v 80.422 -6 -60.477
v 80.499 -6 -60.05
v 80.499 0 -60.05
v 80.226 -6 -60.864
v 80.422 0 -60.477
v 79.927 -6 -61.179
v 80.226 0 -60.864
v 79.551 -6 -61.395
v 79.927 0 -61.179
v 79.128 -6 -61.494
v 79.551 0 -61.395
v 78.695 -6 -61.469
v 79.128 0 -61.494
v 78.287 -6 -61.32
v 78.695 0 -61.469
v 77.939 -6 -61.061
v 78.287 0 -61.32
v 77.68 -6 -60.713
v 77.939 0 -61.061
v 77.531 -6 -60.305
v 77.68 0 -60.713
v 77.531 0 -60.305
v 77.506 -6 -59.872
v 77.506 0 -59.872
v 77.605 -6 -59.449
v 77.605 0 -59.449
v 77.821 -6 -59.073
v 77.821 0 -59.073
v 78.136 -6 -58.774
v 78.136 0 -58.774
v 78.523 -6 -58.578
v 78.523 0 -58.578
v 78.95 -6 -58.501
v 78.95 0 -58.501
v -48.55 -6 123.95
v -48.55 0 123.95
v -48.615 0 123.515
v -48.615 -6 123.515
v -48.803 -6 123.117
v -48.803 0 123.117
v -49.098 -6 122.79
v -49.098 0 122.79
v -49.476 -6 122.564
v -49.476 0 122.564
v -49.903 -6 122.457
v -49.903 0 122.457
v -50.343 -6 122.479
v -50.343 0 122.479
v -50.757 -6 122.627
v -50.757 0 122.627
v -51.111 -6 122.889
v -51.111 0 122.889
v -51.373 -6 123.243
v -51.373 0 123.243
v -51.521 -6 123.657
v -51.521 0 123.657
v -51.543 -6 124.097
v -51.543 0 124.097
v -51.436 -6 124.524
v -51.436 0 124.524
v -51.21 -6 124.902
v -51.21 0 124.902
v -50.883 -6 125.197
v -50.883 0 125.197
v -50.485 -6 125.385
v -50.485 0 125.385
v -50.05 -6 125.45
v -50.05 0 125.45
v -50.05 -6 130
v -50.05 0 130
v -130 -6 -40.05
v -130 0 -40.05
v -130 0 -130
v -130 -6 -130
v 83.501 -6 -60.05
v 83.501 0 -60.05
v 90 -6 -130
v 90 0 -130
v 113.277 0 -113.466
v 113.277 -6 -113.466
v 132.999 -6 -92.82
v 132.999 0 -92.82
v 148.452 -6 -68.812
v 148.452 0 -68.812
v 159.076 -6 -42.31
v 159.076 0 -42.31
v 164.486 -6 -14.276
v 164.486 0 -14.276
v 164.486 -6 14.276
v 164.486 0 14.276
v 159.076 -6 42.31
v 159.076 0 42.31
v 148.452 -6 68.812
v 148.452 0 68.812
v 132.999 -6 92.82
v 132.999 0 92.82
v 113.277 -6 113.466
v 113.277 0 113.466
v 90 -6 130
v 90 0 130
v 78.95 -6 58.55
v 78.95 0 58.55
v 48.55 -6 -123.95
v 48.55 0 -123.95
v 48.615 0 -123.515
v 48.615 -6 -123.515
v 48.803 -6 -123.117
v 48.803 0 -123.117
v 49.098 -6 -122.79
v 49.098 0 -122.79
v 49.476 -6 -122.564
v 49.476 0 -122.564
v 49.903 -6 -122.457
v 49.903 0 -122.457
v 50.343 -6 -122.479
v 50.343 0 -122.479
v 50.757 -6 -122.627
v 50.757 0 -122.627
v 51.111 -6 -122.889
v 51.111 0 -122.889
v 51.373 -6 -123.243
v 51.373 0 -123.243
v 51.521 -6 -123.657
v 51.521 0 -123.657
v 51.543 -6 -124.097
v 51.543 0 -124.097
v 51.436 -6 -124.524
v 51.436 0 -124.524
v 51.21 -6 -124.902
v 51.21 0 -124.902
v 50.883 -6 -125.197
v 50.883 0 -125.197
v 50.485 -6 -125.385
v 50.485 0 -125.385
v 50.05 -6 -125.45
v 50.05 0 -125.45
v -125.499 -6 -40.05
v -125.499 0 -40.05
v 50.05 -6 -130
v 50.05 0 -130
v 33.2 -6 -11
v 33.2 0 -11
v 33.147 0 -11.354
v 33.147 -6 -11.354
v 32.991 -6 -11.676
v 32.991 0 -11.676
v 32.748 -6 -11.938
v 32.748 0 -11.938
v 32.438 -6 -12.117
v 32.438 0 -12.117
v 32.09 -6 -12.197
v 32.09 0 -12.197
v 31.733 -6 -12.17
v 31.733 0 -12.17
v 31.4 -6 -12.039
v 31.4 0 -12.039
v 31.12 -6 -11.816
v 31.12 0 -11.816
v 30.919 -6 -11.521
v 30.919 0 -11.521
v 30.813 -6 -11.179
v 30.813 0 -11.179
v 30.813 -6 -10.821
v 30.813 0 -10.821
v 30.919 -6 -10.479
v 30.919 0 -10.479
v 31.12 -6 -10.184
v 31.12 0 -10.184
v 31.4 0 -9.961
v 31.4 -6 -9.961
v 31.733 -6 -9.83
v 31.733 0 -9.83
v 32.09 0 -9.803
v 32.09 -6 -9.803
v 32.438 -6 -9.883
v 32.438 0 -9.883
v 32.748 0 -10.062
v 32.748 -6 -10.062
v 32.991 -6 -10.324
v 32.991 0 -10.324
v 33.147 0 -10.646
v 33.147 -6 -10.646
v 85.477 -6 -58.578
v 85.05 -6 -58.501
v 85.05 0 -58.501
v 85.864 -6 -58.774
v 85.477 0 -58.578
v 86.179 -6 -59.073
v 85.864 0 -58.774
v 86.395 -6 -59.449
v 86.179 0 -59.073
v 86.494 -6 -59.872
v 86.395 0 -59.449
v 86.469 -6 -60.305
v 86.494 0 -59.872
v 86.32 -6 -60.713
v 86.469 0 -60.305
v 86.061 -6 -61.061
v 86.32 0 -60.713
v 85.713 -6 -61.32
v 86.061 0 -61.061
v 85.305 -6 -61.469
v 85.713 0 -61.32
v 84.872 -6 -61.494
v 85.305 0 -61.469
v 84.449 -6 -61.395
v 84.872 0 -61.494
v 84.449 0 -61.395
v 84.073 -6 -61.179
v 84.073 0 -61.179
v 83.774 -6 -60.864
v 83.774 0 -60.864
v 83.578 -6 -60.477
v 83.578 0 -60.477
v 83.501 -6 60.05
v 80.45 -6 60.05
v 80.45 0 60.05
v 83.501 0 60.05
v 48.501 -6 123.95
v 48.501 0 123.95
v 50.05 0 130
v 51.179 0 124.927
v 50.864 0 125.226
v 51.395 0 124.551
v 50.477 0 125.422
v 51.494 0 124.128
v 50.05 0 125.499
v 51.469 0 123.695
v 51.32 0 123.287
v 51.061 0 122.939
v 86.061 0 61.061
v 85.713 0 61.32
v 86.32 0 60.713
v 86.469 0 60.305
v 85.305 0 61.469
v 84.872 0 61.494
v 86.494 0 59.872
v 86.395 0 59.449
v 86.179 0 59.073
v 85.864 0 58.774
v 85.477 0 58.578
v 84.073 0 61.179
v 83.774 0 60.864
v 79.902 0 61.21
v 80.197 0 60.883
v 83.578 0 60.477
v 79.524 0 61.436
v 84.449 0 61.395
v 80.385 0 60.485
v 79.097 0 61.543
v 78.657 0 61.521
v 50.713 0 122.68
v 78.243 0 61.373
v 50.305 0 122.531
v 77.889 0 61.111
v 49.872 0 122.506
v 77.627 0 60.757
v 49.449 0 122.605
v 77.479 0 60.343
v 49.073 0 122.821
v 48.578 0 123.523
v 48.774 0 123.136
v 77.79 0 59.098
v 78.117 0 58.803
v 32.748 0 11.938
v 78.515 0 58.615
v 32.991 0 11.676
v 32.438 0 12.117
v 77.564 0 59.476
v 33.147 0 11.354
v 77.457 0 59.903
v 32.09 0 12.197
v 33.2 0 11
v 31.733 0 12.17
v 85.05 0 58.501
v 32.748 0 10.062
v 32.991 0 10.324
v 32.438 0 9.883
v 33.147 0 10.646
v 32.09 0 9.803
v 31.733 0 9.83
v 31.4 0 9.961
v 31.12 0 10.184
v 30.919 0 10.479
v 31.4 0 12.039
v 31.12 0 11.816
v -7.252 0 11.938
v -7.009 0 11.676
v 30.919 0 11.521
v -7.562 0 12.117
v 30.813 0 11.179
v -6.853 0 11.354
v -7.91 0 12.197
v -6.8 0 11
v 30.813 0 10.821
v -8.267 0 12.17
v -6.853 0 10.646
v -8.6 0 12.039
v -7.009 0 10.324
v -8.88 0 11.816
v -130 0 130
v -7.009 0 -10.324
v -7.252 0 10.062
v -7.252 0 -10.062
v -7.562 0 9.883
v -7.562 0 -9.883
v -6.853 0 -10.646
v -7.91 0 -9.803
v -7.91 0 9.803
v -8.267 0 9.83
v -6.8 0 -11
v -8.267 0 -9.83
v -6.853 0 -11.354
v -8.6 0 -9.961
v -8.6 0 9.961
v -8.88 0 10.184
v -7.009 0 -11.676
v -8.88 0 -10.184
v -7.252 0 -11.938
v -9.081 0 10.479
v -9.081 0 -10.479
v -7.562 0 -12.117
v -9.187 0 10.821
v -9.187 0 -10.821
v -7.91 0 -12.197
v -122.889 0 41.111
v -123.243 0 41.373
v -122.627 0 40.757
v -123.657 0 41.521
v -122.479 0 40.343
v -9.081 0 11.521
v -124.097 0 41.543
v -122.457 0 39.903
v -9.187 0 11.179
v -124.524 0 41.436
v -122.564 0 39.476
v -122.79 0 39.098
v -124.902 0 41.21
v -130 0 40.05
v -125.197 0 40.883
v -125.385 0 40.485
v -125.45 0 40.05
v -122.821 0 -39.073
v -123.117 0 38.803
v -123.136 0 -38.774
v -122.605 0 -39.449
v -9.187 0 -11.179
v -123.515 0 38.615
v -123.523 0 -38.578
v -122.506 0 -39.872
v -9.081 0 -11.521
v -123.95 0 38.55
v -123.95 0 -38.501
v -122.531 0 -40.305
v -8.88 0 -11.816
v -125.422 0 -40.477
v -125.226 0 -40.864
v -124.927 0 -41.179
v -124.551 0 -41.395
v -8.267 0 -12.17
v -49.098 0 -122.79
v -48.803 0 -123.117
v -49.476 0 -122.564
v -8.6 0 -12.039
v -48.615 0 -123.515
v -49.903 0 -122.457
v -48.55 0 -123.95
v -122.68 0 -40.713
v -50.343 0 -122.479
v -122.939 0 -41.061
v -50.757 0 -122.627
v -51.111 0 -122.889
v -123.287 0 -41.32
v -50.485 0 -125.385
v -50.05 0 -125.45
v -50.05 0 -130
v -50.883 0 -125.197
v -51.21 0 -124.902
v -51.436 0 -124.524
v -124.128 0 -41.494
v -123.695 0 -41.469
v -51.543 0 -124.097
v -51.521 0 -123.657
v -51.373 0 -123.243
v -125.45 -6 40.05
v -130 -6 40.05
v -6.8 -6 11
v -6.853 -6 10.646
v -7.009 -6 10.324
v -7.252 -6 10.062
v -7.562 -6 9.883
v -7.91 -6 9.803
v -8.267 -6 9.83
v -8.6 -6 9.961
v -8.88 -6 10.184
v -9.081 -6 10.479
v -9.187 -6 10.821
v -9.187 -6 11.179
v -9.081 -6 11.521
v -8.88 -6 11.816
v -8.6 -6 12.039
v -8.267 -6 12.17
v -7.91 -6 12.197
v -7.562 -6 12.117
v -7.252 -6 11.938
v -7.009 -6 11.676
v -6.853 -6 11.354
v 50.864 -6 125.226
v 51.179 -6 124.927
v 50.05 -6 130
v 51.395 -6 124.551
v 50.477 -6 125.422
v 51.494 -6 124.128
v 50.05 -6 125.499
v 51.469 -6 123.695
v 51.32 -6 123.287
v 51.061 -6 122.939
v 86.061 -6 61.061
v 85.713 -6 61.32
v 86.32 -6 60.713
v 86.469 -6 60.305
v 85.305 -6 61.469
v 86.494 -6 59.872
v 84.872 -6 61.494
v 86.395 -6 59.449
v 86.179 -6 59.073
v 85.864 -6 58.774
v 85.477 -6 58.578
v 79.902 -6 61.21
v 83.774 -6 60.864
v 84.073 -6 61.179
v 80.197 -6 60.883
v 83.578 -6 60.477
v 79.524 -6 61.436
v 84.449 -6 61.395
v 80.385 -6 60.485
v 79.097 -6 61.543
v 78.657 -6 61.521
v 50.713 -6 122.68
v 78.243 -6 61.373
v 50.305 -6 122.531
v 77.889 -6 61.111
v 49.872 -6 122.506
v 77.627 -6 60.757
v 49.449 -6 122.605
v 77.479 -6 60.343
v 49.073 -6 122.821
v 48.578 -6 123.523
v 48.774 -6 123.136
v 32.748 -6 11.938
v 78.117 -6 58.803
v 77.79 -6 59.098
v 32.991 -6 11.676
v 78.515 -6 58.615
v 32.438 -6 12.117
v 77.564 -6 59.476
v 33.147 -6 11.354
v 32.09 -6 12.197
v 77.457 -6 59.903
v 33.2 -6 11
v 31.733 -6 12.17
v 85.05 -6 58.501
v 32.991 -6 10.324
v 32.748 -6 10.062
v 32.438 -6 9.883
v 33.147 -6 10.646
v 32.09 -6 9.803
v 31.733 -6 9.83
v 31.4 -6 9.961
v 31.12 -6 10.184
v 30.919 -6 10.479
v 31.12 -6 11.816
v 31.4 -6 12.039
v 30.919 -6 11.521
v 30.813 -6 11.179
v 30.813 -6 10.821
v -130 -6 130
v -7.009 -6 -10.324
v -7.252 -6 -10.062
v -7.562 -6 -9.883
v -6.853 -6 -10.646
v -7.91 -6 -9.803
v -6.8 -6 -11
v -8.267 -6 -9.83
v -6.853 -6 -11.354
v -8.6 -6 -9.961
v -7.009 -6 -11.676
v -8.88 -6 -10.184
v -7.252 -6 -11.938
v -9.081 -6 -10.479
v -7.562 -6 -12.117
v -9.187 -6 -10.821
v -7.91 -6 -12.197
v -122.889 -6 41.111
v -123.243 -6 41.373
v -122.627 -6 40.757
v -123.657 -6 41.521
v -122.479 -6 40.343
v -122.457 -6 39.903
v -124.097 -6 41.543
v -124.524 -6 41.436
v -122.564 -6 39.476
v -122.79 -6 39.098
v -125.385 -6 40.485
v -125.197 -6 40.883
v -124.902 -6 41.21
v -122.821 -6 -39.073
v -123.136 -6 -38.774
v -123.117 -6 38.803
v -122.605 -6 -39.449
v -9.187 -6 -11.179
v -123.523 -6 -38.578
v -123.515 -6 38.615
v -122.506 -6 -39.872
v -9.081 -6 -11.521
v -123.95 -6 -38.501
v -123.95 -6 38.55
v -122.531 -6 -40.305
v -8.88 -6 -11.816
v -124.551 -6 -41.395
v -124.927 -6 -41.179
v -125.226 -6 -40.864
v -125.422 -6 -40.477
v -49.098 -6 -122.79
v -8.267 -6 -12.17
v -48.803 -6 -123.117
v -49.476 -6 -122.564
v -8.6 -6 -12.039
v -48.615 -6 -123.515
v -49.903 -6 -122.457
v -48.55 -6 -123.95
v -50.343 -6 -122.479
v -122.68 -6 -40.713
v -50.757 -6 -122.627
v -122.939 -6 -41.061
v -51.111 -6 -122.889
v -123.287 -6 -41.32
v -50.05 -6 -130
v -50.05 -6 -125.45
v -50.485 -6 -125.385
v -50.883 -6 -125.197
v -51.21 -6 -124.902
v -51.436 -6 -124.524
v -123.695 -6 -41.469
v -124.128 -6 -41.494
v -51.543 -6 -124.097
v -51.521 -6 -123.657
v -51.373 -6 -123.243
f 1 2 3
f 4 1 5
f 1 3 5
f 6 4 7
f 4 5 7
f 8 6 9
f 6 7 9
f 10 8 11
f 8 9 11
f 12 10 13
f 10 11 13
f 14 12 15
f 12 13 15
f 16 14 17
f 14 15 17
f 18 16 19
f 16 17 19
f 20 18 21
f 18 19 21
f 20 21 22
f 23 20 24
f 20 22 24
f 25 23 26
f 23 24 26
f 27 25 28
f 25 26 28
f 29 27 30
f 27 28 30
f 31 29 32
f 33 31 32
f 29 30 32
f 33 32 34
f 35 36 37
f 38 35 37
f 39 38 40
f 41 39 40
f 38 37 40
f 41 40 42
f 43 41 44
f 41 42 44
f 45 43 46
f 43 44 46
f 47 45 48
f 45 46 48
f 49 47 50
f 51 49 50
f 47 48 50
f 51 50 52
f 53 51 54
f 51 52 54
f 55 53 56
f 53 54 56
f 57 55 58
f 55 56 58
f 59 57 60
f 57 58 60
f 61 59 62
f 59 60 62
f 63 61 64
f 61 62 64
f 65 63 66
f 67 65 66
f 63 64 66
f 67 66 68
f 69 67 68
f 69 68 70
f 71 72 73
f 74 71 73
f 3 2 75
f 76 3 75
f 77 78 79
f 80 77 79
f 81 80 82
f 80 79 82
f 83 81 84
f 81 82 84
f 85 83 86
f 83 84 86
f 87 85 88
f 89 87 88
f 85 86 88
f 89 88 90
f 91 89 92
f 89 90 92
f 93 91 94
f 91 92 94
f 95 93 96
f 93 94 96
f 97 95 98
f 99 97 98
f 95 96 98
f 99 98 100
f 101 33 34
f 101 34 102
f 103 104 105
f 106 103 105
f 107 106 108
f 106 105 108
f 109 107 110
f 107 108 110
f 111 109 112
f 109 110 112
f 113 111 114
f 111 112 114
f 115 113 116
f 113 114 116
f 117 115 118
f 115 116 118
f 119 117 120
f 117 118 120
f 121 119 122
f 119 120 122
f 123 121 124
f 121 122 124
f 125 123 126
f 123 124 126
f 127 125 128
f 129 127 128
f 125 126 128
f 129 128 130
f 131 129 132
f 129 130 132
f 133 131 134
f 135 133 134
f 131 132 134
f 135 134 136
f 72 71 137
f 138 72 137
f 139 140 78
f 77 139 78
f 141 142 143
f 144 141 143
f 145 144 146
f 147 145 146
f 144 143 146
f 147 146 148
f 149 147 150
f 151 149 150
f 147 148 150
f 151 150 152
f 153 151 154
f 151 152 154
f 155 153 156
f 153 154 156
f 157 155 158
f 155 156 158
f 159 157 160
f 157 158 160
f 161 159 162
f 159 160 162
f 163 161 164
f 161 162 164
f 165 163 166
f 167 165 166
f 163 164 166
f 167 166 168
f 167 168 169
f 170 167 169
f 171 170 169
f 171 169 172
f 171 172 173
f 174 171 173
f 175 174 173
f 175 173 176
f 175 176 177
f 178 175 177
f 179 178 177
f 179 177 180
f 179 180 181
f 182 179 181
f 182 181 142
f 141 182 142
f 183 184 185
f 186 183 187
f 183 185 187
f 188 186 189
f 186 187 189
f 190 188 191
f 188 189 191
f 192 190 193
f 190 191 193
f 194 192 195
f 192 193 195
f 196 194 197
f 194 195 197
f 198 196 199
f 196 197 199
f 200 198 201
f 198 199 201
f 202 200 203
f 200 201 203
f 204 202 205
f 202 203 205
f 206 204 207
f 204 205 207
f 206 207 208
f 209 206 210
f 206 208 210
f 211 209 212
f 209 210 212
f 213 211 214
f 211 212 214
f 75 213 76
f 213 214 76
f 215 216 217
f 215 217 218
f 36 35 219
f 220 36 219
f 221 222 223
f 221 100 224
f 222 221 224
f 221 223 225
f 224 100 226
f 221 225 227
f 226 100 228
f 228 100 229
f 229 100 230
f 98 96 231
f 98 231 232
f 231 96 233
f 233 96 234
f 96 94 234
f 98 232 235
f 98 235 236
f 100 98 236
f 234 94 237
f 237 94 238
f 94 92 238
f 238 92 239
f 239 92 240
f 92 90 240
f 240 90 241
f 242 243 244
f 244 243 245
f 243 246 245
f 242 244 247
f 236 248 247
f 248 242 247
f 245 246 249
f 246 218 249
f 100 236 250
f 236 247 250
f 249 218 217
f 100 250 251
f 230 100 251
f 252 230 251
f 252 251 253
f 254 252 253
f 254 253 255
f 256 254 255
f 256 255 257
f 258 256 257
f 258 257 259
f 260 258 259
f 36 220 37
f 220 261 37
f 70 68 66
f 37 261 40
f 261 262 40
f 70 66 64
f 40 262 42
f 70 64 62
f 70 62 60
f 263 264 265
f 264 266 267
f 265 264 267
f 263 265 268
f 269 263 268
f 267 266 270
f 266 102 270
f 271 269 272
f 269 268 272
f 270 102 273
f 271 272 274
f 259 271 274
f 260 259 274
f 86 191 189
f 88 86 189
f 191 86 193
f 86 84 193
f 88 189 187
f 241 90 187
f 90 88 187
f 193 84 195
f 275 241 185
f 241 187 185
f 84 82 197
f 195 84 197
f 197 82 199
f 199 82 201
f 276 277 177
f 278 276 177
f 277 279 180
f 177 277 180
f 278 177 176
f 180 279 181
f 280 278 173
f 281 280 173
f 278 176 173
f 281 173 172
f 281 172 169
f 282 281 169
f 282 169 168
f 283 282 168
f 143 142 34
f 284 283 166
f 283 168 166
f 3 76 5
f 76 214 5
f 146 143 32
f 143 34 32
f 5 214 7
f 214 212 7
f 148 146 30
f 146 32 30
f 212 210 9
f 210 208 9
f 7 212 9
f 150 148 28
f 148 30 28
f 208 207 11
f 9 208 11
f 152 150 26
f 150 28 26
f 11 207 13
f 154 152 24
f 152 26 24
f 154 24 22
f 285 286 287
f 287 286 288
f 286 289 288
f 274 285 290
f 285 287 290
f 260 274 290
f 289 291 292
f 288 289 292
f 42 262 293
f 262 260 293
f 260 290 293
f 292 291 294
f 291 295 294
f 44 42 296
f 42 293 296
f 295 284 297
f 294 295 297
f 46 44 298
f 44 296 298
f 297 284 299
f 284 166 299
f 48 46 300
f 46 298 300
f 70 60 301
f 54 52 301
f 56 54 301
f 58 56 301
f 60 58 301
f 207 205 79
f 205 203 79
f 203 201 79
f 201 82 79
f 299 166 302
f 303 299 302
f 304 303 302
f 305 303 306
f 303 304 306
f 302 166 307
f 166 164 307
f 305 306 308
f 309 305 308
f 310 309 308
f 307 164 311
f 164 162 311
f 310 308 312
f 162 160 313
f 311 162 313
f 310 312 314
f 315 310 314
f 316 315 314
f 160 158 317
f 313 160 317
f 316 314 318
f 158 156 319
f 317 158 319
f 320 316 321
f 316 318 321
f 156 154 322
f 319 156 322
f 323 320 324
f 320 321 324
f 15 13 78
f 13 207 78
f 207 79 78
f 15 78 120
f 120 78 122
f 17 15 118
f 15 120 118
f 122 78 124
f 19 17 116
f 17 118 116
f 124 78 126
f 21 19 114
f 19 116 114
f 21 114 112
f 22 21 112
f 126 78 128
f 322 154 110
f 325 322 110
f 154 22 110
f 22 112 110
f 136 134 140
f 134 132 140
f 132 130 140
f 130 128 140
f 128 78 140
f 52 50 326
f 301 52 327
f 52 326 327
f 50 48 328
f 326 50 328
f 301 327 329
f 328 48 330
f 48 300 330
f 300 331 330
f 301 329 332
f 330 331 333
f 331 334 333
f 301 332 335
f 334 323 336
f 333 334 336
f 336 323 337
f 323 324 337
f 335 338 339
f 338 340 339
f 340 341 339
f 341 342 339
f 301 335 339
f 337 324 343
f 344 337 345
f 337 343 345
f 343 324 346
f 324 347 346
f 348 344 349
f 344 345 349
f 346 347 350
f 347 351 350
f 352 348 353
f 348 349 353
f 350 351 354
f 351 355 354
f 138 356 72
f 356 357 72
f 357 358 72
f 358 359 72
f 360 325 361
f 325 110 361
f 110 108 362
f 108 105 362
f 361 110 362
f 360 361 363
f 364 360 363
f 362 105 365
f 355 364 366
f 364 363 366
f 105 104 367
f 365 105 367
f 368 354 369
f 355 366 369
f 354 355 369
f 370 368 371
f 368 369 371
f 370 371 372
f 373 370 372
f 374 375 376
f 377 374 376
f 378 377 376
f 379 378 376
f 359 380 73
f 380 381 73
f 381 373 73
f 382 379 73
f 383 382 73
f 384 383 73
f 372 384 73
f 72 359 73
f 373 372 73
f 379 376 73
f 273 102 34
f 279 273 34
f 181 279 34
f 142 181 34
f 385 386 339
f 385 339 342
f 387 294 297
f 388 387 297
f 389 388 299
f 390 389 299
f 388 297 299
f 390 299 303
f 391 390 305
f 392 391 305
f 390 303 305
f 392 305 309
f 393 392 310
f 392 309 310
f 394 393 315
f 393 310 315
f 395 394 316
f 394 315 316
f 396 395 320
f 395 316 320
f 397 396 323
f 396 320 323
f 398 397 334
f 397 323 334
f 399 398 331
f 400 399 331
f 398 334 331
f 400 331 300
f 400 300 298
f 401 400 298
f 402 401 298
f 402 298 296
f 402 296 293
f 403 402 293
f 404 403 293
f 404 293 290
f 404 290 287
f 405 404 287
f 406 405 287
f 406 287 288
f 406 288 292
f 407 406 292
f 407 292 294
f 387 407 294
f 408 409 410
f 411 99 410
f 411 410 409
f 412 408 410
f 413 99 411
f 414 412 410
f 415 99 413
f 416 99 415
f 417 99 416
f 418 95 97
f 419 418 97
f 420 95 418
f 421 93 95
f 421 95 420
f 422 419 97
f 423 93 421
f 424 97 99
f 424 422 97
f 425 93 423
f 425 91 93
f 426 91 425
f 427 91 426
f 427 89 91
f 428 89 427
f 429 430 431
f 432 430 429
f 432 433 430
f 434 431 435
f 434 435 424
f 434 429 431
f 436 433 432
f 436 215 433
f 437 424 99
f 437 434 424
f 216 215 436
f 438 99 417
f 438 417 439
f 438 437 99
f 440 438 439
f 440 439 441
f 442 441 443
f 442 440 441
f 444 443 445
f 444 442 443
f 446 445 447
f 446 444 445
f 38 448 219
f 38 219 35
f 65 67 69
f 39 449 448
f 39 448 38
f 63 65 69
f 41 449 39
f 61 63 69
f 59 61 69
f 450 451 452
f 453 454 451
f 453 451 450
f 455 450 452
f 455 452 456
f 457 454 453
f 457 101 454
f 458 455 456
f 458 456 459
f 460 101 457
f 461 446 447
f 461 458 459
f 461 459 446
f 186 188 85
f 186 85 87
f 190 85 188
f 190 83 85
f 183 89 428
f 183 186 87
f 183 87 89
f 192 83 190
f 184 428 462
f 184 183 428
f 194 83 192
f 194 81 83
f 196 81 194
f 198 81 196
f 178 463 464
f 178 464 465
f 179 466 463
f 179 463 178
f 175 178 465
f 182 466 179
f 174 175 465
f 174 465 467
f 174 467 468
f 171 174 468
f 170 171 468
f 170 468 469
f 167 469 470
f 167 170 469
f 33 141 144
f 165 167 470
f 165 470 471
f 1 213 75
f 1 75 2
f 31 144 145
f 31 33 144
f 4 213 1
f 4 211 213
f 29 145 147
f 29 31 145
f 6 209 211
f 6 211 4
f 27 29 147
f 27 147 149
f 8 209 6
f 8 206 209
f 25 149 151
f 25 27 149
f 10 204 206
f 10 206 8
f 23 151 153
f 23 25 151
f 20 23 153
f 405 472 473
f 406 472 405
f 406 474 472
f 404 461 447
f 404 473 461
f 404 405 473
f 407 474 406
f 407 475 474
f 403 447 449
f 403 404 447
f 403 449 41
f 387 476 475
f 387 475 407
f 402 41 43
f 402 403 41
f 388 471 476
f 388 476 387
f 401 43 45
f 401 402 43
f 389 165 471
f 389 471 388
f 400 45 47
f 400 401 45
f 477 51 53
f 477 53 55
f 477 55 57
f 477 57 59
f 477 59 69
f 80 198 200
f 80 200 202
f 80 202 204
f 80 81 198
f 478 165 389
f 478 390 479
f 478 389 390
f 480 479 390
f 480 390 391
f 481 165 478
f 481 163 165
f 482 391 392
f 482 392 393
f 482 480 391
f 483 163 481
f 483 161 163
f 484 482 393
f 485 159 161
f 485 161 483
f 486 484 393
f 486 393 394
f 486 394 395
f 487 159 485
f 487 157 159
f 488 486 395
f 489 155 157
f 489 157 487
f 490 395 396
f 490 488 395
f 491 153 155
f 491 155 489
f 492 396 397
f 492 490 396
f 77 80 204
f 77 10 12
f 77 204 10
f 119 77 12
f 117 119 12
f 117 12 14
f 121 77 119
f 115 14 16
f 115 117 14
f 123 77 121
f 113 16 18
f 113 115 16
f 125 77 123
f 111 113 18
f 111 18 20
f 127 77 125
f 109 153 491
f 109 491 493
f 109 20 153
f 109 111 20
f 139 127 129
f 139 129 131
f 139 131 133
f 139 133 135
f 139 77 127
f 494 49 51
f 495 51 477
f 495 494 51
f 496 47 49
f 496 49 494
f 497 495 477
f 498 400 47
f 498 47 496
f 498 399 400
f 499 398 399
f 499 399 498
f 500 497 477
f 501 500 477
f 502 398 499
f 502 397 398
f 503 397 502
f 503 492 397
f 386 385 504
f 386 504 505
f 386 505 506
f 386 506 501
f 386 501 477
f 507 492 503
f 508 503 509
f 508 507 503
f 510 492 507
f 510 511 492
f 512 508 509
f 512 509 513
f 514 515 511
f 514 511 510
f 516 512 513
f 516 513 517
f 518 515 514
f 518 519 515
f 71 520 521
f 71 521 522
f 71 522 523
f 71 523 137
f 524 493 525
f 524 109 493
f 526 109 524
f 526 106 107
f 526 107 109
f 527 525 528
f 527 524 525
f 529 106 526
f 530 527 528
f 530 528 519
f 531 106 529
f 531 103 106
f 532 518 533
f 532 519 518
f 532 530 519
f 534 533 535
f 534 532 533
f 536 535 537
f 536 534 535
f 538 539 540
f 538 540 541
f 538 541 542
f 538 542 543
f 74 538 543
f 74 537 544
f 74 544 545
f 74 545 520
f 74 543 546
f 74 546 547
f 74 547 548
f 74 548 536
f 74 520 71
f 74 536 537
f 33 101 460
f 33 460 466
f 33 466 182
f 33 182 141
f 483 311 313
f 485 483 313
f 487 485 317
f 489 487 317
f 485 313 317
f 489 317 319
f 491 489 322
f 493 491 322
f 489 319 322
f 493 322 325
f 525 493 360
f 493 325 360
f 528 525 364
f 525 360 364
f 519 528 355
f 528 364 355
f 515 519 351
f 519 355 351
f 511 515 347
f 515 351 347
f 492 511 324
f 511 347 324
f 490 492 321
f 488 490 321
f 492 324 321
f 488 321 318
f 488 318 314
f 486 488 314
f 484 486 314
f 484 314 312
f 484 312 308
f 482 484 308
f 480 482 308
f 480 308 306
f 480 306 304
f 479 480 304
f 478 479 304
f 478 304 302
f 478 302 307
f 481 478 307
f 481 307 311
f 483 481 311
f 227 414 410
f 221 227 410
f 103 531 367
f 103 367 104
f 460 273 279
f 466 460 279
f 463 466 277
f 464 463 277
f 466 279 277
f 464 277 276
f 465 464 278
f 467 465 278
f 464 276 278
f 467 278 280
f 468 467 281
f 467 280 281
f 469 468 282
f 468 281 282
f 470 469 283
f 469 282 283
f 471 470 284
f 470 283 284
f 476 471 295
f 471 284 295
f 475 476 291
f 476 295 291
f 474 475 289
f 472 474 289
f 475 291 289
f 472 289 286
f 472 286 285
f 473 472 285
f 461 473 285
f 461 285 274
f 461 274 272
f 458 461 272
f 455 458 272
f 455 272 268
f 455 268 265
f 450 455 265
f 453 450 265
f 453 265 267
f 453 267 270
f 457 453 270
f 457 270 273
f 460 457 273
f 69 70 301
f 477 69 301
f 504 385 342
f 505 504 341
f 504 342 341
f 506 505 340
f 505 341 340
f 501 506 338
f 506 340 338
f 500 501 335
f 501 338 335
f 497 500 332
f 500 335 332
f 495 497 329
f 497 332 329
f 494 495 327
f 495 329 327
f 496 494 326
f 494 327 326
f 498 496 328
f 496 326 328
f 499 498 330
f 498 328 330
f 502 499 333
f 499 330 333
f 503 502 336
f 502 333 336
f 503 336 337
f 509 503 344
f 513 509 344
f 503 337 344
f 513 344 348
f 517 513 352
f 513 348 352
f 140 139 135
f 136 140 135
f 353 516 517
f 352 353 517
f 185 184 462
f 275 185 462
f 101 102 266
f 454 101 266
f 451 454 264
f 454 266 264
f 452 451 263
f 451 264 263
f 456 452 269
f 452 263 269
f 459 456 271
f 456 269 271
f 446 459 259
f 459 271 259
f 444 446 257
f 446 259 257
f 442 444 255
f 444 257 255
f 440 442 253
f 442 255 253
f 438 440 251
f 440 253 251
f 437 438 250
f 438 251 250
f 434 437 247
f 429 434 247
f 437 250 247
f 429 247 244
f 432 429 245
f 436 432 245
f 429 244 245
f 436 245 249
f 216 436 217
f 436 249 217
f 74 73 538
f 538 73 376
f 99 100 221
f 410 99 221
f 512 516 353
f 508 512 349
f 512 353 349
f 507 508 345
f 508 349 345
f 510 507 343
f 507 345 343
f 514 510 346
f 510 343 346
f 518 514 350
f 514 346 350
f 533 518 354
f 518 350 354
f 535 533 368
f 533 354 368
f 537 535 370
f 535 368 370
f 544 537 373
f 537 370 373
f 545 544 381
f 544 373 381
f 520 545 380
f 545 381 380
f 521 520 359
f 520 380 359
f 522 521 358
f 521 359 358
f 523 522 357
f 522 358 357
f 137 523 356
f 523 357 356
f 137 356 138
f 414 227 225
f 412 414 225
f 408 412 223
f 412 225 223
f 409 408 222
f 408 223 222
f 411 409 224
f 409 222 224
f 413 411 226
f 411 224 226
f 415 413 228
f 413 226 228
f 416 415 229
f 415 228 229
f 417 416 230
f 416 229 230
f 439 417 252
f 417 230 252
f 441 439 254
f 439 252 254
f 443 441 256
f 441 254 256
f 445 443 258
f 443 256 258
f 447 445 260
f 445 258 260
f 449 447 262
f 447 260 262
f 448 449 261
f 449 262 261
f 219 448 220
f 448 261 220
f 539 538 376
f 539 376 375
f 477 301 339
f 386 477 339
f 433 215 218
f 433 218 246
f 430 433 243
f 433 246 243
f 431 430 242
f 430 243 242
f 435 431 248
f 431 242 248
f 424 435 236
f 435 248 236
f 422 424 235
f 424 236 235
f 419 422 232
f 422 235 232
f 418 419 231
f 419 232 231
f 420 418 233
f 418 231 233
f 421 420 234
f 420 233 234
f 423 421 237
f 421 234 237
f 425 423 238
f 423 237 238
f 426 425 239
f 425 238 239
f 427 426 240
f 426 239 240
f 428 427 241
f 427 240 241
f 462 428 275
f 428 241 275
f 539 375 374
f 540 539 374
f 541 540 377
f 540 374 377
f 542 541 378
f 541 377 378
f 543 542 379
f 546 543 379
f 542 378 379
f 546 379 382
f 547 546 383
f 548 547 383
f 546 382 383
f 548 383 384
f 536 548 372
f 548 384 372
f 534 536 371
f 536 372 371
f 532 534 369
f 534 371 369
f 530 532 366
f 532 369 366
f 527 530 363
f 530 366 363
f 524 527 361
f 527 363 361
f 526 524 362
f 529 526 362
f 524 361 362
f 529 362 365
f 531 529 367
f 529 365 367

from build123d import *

# Parameters (mm, degrees)
BOSS_EXTRUDE1_DEPTH       = 6
M2_CLEARANCE_HOLE1_D      = 2.4
CUT_EXTRUDE1_REACH        = 212.276
SKETCH4_W                 = 6.1
SKETCH4_H                 = 120.1
SKETCH4_W_2               = 100.1
SKETCH4_H_2               = 6.1
SKETCH4_H_3               = 80.1
F_3_0MM_DOWEL_HOLE1_D     = 3
F_3_0MM_DOWEL_HOLE1_DEPTH = 6


with BuildPart() as part:
    # Sketch1 → Boss-Extrude1 (new body)
    with BuildSketch(Plane(origin=(0, 0, 0), x_dir=(1, 0, 0), z_dir=(0, 1, 0))):
        with BuildLine():
            Line((-130, 130), (90, 130))
            ThreePointArc((90, 130), (165.166852265, 0), (90, -130))
            Line((90, -130), (-130, -130))
            Line((-130, -130), (-130, 130))
        make_face()
    extrude(amount=-BOSS_EXTRUDE1_DEPTH)

    # M2 Clearance Hole1 (through all)
    with Locations(Plane(origin=(0, -6, 0), x_dir=(-1, 0, 0), z_dir=(0, -1, 0))):
        with Locations((-32, -11), (-32, 11), (8, -11), (8, 11)):
            Hole(M2_CLEARANCE_HOLE1_D / 2)

    # Sketch4 → Cut-Extrude1 (cut, up to next)
    with BuildSketch(Plane.XZ.offset(6), mode=Mode.PRIVATE) as cut_extrude1_sk1:
        with Locations((82, 0)):
            Rectangle(SKETCH4_W, SKETCH4_H)
    cut_extrude1_tool1 = extrude(cut_extrude1_sk1.sketch, amount=-CUT_EXTRUDE1_REACH, mode=Mode.PRIVATE) & part.part
    # Sketch4 → Cut-Extrude1 (cut, up to next)
    with BuildSketch(Plane.XZ.offset(6), mode=Mode.PRIVATE) as cut_extrude1_sk2:
        with Locations((0, -127)):
            Rectangle(SKETCH4_W_2, SKETCH4_H_2)
    cut_extrude1_tool2 = extrude(cut_extrude1_sk2.sketch, amount=-CUT_EXTRUDE1_REACH, mode=Mode.PRIVATE) & part.part
    # Sketch4 → Cut-Extrude1 (cut, up to next)
    with BuildSketch(Plane.XZ.offset(6), mode=Mode.PRIVATE) as cut_extrude1_sk3:
        with Locations((0, 127)):
            Rectangle(SKETCH4_W_2, SKETCH4_H_2)
    cut_extrude1_tool3 = extrude(cut_extrude1_sk3.sketch, amount=-CUT_EXTRUDE1_REACH, mode=Mode.PRIVATE) & part.part
    # Sketch4 → Cut-Extrude1 (cut, up to next)
    with BuildSketch(Plane.XZ.offset(6), mode=Mode.PRIVATE) as cut_extrude1_sk4:
        with Locations((-127, 0)):
            Rectangle(SKETCH4_W, SKETCH4_H_3)
    cut_extrude1_tool4 = extrude(cut_extrude1_sk4.sketch, amount=-CUT_EXTRUDE1_REACH, mode=Mode.PRIVATE) & part.part
    add(cut_extrude1_tool1.solids().sort_by_distance((82, -6, 0))[0], mode=Mode.SUBTRACT)
    add(cut_extrude1_tool2.solids().sort_by_distance((0, -6, -127))[0], mode=Mode.SUBTRACT)
    add(cut_extrude1_tool3.solids().sort_by_distance((0, -6, 127))[0], mode=Mode.SUBTRACT)
    add(cut_extrude1_tool4.solids().sort_by_distance((-127, -6, 0))[0], mode=Mode.SUBTRACT)

    # Ø3.0mm Dowel Hole1
    with Locations(Plane(origin=(0, -6, 0), x_dir=(-1, 0, 0), z_dir=(0, -1, 0))):
        with Locations((-85, 60), (-79, 60), (-78.95, -60.05), (-85, -60), (124, 40), (123.95, -40.05), (50.05, -123.95), (-50, -124), (-50.05, 123.95), (50.05, 123.95)):
            Hole(F_3_0MM_DOWEL_HOLE1_D / 2, depth=F_3_0MM_DOWEL_HOLE1_DEPTH)


solid = part.part
